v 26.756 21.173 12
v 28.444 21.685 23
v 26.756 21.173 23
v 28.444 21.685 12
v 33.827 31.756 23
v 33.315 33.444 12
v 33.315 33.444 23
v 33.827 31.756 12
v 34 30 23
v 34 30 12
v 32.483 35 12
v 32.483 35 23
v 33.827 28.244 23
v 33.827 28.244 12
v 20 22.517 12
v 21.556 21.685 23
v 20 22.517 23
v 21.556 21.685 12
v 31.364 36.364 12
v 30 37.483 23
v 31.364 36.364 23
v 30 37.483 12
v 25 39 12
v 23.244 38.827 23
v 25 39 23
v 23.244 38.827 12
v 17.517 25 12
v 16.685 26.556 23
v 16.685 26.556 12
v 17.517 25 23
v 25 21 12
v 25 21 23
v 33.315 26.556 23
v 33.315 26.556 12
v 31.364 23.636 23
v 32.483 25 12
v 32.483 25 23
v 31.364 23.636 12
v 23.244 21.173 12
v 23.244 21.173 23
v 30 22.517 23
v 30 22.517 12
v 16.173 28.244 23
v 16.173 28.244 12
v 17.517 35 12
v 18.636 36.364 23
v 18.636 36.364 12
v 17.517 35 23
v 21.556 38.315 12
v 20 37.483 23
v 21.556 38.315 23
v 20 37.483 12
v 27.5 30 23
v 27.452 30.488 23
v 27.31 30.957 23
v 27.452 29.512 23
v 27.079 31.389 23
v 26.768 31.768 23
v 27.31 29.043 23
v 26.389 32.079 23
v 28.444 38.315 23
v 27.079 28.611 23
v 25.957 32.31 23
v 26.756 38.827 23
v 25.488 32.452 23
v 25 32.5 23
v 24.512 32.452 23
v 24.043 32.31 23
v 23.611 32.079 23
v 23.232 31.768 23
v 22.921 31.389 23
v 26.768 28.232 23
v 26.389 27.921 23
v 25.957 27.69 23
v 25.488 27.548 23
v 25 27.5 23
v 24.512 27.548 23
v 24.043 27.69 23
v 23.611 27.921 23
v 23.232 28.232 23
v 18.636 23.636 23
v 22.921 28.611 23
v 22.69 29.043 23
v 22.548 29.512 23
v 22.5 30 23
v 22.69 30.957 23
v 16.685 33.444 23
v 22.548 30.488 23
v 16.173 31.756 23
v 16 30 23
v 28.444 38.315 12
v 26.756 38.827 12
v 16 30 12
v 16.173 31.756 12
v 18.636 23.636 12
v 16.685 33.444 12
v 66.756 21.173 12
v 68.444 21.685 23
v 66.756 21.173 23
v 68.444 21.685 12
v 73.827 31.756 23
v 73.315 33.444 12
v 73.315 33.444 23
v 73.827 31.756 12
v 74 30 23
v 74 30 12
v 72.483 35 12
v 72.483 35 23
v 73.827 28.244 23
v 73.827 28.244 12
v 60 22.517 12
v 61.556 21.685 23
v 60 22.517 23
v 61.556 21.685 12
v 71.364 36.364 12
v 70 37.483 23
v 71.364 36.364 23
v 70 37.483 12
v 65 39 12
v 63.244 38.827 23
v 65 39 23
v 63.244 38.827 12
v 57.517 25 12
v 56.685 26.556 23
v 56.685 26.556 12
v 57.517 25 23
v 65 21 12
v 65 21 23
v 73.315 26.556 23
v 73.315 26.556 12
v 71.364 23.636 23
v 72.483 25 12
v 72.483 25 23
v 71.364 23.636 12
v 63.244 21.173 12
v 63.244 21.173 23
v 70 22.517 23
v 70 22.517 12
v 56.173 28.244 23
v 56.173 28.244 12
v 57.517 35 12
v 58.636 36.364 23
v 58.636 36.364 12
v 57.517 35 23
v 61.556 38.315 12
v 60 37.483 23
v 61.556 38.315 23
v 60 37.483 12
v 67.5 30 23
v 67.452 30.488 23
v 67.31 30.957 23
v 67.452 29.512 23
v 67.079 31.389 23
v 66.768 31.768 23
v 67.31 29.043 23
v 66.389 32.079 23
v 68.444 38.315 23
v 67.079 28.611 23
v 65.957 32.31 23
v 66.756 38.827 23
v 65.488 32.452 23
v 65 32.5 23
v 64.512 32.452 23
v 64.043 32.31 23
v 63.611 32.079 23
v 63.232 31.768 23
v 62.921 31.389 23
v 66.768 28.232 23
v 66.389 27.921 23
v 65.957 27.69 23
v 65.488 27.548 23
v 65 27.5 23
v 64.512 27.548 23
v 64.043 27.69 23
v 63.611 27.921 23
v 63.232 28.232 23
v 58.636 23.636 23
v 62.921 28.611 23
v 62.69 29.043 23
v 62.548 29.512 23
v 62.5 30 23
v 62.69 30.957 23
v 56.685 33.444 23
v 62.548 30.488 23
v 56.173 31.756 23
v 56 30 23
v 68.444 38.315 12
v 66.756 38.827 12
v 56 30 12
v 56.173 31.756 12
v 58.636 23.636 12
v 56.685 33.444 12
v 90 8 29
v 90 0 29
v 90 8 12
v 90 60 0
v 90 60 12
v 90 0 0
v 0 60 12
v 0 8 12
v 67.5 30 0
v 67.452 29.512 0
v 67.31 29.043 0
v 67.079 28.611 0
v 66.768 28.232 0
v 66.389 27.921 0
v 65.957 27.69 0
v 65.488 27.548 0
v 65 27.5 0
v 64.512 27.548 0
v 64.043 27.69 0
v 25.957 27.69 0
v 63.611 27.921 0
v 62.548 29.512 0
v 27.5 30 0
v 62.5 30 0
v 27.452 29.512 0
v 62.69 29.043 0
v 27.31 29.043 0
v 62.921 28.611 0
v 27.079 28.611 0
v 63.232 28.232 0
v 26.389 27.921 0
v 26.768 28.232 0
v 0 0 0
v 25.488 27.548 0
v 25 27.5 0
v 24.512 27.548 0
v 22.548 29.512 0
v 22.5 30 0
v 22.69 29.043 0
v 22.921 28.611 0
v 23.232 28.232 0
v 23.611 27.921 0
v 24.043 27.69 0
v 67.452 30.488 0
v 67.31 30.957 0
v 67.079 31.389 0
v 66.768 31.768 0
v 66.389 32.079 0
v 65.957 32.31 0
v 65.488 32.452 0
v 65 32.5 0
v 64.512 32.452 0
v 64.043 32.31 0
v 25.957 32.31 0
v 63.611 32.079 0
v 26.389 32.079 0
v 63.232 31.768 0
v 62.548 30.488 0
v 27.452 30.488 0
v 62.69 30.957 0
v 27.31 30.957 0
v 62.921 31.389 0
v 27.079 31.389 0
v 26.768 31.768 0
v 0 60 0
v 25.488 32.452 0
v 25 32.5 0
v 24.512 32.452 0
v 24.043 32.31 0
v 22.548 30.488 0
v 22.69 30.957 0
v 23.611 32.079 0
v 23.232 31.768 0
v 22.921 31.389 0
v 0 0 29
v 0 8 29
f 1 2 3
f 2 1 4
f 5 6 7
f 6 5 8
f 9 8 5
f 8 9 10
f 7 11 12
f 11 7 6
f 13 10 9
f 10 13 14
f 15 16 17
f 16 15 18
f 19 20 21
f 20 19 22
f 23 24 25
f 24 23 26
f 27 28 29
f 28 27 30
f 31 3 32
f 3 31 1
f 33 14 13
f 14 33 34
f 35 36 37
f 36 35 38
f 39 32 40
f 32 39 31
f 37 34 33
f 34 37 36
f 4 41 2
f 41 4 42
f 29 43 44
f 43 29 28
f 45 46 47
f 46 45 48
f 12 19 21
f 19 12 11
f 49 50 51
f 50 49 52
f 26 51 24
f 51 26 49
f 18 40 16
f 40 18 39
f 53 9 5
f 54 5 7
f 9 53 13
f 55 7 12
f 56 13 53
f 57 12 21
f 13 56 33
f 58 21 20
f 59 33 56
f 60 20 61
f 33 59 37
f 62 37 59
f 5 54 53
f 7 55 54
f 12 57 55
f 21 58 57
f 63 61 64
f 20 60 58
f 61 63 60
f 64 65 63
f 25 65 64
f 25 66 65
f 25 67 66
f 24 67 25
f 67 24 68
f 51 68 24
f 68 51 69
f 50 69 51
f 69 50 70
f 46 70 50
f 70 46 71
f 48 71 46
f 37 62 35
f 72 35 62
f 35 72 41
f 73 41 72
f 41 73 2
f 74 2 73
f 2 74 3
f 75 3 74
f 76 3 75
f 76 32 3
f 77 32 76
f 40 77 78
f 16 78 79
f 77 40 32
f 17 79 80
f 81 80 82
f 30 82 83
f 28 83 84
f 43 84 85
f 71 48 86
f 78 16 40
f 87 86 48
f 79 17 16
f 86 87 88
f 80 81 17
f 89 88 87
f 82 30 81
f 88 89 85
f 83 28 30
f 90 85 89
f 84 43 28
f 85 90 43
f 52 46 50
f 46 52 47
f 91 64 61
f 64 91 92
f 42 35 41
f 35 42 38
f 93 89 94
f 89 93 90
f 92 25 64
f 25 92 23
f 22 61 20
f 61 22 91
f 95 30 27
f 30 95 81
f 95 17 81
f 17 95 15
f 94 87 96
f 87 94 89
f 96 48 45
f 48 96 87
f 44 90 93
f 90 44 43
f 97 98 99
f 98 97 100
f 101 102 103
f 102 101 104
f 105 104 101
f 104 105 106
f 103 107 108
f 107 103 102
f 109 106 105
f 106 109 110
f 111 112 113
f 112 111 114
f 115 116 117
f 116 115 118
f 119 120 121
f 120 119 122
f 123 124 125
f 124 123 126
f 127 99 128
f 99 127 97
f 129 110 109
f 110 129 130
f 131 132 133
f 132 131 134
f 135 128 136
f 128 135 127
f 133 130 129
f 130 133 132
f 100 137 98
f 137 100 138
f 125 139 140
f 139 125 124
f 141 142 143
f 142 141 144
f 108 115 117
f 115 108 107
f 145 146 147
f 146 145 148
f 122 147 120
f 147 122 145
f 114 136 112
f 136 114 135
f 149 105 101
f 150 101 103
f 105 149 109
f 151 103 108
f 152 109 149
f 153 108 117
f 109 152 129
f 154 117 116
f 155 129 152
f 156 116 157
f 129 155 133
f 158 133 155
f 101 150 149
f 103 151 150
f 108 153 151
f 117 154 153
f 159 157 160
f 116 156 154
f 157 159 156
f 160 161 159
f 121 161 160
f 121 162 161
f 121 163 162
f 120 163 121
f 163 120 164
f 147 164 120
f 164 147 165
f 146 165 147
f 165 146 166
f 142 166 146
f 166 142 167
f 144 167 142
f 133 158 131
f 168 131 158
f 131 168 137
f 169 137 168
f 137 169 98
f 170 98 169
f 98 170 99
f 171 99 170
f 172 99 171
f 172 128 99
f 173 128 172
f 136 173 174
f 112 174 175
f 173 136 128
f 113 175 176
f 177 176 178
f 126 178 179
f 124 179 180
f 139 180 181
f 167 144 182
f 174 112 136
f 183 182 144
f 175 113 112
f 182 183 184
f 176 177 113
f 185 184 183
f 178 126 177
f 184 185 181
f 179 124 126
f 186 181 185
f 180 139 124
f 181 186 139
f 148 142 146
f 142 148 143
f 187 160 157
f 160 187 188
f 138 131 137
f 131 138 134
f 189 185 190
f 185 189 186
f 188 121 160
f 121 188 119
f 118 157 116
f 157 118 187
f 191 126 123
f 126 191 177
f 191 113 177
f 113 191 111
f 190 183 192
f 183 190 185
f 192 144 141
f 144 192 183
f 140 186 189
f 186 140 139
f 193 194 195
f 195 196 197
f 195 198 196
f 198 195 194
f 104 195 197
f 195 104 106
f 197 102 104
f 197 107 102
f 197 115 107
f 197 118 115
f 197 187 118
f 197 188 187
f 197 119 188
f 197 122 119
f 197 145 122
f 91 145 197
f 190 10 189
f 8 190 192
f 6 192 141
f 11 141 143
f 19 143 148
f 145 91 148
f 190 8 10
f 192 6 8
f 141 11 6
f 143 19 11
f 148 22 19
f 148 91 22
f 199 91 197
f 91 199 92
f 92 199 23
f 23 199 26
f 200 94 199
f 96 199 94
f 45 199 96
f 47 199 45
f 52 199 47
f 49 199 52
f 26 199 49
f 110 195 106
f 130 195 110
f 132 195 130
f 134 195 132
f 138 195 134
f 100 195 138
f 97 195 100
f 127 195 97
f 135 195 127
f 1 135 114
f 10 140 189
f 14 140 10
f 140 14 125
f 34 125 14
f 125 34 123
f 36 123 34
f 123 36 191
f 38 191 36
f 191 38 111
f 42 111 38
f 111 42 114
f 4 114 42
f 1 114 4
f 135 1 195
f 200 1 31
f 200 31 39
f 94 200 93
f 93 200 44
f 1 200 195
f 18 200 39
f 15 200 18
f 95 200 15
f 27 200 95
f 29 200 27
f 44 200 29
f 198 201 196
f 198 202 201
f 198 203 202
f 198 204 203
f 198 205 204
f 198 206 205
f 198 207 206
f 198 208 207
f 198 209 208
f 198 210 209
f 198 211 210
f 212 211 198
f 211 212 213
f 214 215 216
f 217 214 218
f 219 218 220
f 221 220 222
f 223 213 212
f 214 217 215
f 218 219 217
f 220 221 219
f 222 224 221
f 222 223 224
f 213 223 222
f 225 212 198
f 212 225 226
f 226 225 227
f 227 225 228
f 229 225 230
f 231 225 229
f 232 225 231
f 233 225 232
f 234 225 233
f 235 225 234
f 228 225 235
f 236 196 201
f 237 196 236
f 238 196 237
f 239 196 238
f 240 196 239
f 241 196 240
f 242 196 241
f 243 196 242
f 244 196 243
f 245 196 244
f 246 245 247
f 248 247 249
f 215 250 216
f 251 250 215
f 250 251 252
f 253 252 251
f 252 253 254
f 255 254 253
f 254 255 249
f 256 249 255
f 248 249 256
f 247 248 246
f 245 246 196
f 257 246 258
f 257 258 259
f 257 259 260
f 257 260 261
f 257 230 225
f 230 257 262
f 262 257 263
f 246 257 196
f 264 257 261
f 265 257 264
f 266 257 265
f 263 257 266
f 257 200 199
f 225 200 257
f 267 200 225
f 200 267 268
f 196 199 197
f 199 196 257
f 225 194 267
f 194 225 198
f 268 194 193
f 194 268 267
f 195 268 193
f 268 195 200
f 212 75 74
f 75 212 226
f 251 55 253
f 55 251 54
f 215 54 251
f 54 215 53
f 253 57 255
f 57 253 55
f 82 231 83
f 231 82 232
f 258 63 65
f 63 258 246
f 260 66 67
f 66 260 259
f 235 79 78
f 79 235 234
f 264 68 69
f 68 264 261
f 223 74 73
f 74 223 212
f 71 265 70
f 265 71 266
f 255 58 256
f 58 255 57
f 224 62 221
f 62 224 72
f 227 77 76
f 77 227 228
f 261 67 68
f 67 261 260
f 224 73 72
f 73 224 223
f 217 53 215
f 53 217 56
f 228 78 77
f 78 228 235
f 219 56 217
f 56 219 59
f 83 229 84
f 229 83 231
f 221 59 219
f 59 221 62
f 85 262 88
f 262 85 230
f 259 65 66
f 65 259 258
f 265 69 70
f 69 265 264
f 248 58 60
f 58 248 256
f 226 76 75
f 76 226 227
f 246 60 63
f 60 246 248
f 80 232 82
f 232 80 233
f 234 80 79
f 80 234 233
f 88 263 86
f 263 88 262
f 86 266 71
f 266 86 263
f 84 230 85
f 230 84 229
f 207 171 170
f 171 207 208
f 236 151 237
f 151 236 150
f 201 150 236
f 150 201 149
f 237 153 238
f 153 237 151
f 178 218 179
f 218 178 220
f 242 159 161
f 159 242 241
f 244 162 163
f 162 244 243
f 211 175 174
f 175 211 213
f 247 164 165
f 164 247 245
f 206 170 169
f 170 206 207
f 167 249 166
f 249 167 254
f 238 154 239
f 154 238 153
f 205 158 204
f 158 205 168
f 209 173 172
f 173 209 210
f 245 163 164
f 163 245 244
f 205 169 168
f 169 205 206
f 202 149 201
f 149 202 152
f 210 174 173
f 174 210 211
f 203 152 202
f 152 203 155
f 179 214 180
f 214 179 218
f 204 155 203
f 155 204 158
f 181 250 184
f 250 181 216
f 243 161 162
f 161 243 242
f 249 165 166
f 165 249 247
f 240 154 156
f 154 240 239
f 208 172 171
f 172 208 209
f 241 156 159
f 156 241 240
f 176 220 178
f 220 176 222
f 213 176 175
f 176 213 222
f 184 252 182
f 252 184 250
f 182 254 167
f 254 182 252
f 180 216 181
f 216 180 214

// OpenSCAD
$fn = 32;

// ----------------------------------------------------------------------
// Drill jig: fence jig
// ----------------------------------------------------------------------

// --- parameters (mm) ---
plate_l = 90;             // plate length, X
plate_w = 60;             // plate width, Y
plate_t = 12;             // plate thickness
boss_d = 18;              // guide boss diameter
boss_h = 12;              // boss height above the plate
guide_d = 5;              // guide hole diameter
boss_pitch = 40;          // boss pitch
fence_h = 18;             // fence height above the plate
fence_t = 8;              // fence thickness
fit_tol = 0.02;           // tolerance for press fits, mm
free_tol = 0.2;           // tolerance for clearance fits, mm

n_boss = 2;  // guide bosses
boss_x0 = (plate_l - (n_boss - 1) * boss_pitch) / 2;  // first boss X
boss_top = plate_t - 1 + boss_h;  // boss crown height
fence_top = plate_t - 1 + fence_h;  // fence crown height
total_h = max([fence_top, boss_top]);  // overall height

difference() {
  union() {
  cube([plate_l, plate_w, plate_t]);
  for (i = [0 : n_boss - 1])
    translate([boss_x0 + i * boss_pitch, plate_w / 2, plate_t - 1])
      cylinder(h = boss_h, d = boss_d);
  translate([0, 0, plate_t - 1]) cube([plate_l, fence_t, fence_h]);
  }
  for (i = [0 : n_boss - 1])
    translate([boss_x0 + i * boss_pitch, plate_w / 2, -1])
      cylinder(h = plate_t + boss_h, d = guide_d);
}
